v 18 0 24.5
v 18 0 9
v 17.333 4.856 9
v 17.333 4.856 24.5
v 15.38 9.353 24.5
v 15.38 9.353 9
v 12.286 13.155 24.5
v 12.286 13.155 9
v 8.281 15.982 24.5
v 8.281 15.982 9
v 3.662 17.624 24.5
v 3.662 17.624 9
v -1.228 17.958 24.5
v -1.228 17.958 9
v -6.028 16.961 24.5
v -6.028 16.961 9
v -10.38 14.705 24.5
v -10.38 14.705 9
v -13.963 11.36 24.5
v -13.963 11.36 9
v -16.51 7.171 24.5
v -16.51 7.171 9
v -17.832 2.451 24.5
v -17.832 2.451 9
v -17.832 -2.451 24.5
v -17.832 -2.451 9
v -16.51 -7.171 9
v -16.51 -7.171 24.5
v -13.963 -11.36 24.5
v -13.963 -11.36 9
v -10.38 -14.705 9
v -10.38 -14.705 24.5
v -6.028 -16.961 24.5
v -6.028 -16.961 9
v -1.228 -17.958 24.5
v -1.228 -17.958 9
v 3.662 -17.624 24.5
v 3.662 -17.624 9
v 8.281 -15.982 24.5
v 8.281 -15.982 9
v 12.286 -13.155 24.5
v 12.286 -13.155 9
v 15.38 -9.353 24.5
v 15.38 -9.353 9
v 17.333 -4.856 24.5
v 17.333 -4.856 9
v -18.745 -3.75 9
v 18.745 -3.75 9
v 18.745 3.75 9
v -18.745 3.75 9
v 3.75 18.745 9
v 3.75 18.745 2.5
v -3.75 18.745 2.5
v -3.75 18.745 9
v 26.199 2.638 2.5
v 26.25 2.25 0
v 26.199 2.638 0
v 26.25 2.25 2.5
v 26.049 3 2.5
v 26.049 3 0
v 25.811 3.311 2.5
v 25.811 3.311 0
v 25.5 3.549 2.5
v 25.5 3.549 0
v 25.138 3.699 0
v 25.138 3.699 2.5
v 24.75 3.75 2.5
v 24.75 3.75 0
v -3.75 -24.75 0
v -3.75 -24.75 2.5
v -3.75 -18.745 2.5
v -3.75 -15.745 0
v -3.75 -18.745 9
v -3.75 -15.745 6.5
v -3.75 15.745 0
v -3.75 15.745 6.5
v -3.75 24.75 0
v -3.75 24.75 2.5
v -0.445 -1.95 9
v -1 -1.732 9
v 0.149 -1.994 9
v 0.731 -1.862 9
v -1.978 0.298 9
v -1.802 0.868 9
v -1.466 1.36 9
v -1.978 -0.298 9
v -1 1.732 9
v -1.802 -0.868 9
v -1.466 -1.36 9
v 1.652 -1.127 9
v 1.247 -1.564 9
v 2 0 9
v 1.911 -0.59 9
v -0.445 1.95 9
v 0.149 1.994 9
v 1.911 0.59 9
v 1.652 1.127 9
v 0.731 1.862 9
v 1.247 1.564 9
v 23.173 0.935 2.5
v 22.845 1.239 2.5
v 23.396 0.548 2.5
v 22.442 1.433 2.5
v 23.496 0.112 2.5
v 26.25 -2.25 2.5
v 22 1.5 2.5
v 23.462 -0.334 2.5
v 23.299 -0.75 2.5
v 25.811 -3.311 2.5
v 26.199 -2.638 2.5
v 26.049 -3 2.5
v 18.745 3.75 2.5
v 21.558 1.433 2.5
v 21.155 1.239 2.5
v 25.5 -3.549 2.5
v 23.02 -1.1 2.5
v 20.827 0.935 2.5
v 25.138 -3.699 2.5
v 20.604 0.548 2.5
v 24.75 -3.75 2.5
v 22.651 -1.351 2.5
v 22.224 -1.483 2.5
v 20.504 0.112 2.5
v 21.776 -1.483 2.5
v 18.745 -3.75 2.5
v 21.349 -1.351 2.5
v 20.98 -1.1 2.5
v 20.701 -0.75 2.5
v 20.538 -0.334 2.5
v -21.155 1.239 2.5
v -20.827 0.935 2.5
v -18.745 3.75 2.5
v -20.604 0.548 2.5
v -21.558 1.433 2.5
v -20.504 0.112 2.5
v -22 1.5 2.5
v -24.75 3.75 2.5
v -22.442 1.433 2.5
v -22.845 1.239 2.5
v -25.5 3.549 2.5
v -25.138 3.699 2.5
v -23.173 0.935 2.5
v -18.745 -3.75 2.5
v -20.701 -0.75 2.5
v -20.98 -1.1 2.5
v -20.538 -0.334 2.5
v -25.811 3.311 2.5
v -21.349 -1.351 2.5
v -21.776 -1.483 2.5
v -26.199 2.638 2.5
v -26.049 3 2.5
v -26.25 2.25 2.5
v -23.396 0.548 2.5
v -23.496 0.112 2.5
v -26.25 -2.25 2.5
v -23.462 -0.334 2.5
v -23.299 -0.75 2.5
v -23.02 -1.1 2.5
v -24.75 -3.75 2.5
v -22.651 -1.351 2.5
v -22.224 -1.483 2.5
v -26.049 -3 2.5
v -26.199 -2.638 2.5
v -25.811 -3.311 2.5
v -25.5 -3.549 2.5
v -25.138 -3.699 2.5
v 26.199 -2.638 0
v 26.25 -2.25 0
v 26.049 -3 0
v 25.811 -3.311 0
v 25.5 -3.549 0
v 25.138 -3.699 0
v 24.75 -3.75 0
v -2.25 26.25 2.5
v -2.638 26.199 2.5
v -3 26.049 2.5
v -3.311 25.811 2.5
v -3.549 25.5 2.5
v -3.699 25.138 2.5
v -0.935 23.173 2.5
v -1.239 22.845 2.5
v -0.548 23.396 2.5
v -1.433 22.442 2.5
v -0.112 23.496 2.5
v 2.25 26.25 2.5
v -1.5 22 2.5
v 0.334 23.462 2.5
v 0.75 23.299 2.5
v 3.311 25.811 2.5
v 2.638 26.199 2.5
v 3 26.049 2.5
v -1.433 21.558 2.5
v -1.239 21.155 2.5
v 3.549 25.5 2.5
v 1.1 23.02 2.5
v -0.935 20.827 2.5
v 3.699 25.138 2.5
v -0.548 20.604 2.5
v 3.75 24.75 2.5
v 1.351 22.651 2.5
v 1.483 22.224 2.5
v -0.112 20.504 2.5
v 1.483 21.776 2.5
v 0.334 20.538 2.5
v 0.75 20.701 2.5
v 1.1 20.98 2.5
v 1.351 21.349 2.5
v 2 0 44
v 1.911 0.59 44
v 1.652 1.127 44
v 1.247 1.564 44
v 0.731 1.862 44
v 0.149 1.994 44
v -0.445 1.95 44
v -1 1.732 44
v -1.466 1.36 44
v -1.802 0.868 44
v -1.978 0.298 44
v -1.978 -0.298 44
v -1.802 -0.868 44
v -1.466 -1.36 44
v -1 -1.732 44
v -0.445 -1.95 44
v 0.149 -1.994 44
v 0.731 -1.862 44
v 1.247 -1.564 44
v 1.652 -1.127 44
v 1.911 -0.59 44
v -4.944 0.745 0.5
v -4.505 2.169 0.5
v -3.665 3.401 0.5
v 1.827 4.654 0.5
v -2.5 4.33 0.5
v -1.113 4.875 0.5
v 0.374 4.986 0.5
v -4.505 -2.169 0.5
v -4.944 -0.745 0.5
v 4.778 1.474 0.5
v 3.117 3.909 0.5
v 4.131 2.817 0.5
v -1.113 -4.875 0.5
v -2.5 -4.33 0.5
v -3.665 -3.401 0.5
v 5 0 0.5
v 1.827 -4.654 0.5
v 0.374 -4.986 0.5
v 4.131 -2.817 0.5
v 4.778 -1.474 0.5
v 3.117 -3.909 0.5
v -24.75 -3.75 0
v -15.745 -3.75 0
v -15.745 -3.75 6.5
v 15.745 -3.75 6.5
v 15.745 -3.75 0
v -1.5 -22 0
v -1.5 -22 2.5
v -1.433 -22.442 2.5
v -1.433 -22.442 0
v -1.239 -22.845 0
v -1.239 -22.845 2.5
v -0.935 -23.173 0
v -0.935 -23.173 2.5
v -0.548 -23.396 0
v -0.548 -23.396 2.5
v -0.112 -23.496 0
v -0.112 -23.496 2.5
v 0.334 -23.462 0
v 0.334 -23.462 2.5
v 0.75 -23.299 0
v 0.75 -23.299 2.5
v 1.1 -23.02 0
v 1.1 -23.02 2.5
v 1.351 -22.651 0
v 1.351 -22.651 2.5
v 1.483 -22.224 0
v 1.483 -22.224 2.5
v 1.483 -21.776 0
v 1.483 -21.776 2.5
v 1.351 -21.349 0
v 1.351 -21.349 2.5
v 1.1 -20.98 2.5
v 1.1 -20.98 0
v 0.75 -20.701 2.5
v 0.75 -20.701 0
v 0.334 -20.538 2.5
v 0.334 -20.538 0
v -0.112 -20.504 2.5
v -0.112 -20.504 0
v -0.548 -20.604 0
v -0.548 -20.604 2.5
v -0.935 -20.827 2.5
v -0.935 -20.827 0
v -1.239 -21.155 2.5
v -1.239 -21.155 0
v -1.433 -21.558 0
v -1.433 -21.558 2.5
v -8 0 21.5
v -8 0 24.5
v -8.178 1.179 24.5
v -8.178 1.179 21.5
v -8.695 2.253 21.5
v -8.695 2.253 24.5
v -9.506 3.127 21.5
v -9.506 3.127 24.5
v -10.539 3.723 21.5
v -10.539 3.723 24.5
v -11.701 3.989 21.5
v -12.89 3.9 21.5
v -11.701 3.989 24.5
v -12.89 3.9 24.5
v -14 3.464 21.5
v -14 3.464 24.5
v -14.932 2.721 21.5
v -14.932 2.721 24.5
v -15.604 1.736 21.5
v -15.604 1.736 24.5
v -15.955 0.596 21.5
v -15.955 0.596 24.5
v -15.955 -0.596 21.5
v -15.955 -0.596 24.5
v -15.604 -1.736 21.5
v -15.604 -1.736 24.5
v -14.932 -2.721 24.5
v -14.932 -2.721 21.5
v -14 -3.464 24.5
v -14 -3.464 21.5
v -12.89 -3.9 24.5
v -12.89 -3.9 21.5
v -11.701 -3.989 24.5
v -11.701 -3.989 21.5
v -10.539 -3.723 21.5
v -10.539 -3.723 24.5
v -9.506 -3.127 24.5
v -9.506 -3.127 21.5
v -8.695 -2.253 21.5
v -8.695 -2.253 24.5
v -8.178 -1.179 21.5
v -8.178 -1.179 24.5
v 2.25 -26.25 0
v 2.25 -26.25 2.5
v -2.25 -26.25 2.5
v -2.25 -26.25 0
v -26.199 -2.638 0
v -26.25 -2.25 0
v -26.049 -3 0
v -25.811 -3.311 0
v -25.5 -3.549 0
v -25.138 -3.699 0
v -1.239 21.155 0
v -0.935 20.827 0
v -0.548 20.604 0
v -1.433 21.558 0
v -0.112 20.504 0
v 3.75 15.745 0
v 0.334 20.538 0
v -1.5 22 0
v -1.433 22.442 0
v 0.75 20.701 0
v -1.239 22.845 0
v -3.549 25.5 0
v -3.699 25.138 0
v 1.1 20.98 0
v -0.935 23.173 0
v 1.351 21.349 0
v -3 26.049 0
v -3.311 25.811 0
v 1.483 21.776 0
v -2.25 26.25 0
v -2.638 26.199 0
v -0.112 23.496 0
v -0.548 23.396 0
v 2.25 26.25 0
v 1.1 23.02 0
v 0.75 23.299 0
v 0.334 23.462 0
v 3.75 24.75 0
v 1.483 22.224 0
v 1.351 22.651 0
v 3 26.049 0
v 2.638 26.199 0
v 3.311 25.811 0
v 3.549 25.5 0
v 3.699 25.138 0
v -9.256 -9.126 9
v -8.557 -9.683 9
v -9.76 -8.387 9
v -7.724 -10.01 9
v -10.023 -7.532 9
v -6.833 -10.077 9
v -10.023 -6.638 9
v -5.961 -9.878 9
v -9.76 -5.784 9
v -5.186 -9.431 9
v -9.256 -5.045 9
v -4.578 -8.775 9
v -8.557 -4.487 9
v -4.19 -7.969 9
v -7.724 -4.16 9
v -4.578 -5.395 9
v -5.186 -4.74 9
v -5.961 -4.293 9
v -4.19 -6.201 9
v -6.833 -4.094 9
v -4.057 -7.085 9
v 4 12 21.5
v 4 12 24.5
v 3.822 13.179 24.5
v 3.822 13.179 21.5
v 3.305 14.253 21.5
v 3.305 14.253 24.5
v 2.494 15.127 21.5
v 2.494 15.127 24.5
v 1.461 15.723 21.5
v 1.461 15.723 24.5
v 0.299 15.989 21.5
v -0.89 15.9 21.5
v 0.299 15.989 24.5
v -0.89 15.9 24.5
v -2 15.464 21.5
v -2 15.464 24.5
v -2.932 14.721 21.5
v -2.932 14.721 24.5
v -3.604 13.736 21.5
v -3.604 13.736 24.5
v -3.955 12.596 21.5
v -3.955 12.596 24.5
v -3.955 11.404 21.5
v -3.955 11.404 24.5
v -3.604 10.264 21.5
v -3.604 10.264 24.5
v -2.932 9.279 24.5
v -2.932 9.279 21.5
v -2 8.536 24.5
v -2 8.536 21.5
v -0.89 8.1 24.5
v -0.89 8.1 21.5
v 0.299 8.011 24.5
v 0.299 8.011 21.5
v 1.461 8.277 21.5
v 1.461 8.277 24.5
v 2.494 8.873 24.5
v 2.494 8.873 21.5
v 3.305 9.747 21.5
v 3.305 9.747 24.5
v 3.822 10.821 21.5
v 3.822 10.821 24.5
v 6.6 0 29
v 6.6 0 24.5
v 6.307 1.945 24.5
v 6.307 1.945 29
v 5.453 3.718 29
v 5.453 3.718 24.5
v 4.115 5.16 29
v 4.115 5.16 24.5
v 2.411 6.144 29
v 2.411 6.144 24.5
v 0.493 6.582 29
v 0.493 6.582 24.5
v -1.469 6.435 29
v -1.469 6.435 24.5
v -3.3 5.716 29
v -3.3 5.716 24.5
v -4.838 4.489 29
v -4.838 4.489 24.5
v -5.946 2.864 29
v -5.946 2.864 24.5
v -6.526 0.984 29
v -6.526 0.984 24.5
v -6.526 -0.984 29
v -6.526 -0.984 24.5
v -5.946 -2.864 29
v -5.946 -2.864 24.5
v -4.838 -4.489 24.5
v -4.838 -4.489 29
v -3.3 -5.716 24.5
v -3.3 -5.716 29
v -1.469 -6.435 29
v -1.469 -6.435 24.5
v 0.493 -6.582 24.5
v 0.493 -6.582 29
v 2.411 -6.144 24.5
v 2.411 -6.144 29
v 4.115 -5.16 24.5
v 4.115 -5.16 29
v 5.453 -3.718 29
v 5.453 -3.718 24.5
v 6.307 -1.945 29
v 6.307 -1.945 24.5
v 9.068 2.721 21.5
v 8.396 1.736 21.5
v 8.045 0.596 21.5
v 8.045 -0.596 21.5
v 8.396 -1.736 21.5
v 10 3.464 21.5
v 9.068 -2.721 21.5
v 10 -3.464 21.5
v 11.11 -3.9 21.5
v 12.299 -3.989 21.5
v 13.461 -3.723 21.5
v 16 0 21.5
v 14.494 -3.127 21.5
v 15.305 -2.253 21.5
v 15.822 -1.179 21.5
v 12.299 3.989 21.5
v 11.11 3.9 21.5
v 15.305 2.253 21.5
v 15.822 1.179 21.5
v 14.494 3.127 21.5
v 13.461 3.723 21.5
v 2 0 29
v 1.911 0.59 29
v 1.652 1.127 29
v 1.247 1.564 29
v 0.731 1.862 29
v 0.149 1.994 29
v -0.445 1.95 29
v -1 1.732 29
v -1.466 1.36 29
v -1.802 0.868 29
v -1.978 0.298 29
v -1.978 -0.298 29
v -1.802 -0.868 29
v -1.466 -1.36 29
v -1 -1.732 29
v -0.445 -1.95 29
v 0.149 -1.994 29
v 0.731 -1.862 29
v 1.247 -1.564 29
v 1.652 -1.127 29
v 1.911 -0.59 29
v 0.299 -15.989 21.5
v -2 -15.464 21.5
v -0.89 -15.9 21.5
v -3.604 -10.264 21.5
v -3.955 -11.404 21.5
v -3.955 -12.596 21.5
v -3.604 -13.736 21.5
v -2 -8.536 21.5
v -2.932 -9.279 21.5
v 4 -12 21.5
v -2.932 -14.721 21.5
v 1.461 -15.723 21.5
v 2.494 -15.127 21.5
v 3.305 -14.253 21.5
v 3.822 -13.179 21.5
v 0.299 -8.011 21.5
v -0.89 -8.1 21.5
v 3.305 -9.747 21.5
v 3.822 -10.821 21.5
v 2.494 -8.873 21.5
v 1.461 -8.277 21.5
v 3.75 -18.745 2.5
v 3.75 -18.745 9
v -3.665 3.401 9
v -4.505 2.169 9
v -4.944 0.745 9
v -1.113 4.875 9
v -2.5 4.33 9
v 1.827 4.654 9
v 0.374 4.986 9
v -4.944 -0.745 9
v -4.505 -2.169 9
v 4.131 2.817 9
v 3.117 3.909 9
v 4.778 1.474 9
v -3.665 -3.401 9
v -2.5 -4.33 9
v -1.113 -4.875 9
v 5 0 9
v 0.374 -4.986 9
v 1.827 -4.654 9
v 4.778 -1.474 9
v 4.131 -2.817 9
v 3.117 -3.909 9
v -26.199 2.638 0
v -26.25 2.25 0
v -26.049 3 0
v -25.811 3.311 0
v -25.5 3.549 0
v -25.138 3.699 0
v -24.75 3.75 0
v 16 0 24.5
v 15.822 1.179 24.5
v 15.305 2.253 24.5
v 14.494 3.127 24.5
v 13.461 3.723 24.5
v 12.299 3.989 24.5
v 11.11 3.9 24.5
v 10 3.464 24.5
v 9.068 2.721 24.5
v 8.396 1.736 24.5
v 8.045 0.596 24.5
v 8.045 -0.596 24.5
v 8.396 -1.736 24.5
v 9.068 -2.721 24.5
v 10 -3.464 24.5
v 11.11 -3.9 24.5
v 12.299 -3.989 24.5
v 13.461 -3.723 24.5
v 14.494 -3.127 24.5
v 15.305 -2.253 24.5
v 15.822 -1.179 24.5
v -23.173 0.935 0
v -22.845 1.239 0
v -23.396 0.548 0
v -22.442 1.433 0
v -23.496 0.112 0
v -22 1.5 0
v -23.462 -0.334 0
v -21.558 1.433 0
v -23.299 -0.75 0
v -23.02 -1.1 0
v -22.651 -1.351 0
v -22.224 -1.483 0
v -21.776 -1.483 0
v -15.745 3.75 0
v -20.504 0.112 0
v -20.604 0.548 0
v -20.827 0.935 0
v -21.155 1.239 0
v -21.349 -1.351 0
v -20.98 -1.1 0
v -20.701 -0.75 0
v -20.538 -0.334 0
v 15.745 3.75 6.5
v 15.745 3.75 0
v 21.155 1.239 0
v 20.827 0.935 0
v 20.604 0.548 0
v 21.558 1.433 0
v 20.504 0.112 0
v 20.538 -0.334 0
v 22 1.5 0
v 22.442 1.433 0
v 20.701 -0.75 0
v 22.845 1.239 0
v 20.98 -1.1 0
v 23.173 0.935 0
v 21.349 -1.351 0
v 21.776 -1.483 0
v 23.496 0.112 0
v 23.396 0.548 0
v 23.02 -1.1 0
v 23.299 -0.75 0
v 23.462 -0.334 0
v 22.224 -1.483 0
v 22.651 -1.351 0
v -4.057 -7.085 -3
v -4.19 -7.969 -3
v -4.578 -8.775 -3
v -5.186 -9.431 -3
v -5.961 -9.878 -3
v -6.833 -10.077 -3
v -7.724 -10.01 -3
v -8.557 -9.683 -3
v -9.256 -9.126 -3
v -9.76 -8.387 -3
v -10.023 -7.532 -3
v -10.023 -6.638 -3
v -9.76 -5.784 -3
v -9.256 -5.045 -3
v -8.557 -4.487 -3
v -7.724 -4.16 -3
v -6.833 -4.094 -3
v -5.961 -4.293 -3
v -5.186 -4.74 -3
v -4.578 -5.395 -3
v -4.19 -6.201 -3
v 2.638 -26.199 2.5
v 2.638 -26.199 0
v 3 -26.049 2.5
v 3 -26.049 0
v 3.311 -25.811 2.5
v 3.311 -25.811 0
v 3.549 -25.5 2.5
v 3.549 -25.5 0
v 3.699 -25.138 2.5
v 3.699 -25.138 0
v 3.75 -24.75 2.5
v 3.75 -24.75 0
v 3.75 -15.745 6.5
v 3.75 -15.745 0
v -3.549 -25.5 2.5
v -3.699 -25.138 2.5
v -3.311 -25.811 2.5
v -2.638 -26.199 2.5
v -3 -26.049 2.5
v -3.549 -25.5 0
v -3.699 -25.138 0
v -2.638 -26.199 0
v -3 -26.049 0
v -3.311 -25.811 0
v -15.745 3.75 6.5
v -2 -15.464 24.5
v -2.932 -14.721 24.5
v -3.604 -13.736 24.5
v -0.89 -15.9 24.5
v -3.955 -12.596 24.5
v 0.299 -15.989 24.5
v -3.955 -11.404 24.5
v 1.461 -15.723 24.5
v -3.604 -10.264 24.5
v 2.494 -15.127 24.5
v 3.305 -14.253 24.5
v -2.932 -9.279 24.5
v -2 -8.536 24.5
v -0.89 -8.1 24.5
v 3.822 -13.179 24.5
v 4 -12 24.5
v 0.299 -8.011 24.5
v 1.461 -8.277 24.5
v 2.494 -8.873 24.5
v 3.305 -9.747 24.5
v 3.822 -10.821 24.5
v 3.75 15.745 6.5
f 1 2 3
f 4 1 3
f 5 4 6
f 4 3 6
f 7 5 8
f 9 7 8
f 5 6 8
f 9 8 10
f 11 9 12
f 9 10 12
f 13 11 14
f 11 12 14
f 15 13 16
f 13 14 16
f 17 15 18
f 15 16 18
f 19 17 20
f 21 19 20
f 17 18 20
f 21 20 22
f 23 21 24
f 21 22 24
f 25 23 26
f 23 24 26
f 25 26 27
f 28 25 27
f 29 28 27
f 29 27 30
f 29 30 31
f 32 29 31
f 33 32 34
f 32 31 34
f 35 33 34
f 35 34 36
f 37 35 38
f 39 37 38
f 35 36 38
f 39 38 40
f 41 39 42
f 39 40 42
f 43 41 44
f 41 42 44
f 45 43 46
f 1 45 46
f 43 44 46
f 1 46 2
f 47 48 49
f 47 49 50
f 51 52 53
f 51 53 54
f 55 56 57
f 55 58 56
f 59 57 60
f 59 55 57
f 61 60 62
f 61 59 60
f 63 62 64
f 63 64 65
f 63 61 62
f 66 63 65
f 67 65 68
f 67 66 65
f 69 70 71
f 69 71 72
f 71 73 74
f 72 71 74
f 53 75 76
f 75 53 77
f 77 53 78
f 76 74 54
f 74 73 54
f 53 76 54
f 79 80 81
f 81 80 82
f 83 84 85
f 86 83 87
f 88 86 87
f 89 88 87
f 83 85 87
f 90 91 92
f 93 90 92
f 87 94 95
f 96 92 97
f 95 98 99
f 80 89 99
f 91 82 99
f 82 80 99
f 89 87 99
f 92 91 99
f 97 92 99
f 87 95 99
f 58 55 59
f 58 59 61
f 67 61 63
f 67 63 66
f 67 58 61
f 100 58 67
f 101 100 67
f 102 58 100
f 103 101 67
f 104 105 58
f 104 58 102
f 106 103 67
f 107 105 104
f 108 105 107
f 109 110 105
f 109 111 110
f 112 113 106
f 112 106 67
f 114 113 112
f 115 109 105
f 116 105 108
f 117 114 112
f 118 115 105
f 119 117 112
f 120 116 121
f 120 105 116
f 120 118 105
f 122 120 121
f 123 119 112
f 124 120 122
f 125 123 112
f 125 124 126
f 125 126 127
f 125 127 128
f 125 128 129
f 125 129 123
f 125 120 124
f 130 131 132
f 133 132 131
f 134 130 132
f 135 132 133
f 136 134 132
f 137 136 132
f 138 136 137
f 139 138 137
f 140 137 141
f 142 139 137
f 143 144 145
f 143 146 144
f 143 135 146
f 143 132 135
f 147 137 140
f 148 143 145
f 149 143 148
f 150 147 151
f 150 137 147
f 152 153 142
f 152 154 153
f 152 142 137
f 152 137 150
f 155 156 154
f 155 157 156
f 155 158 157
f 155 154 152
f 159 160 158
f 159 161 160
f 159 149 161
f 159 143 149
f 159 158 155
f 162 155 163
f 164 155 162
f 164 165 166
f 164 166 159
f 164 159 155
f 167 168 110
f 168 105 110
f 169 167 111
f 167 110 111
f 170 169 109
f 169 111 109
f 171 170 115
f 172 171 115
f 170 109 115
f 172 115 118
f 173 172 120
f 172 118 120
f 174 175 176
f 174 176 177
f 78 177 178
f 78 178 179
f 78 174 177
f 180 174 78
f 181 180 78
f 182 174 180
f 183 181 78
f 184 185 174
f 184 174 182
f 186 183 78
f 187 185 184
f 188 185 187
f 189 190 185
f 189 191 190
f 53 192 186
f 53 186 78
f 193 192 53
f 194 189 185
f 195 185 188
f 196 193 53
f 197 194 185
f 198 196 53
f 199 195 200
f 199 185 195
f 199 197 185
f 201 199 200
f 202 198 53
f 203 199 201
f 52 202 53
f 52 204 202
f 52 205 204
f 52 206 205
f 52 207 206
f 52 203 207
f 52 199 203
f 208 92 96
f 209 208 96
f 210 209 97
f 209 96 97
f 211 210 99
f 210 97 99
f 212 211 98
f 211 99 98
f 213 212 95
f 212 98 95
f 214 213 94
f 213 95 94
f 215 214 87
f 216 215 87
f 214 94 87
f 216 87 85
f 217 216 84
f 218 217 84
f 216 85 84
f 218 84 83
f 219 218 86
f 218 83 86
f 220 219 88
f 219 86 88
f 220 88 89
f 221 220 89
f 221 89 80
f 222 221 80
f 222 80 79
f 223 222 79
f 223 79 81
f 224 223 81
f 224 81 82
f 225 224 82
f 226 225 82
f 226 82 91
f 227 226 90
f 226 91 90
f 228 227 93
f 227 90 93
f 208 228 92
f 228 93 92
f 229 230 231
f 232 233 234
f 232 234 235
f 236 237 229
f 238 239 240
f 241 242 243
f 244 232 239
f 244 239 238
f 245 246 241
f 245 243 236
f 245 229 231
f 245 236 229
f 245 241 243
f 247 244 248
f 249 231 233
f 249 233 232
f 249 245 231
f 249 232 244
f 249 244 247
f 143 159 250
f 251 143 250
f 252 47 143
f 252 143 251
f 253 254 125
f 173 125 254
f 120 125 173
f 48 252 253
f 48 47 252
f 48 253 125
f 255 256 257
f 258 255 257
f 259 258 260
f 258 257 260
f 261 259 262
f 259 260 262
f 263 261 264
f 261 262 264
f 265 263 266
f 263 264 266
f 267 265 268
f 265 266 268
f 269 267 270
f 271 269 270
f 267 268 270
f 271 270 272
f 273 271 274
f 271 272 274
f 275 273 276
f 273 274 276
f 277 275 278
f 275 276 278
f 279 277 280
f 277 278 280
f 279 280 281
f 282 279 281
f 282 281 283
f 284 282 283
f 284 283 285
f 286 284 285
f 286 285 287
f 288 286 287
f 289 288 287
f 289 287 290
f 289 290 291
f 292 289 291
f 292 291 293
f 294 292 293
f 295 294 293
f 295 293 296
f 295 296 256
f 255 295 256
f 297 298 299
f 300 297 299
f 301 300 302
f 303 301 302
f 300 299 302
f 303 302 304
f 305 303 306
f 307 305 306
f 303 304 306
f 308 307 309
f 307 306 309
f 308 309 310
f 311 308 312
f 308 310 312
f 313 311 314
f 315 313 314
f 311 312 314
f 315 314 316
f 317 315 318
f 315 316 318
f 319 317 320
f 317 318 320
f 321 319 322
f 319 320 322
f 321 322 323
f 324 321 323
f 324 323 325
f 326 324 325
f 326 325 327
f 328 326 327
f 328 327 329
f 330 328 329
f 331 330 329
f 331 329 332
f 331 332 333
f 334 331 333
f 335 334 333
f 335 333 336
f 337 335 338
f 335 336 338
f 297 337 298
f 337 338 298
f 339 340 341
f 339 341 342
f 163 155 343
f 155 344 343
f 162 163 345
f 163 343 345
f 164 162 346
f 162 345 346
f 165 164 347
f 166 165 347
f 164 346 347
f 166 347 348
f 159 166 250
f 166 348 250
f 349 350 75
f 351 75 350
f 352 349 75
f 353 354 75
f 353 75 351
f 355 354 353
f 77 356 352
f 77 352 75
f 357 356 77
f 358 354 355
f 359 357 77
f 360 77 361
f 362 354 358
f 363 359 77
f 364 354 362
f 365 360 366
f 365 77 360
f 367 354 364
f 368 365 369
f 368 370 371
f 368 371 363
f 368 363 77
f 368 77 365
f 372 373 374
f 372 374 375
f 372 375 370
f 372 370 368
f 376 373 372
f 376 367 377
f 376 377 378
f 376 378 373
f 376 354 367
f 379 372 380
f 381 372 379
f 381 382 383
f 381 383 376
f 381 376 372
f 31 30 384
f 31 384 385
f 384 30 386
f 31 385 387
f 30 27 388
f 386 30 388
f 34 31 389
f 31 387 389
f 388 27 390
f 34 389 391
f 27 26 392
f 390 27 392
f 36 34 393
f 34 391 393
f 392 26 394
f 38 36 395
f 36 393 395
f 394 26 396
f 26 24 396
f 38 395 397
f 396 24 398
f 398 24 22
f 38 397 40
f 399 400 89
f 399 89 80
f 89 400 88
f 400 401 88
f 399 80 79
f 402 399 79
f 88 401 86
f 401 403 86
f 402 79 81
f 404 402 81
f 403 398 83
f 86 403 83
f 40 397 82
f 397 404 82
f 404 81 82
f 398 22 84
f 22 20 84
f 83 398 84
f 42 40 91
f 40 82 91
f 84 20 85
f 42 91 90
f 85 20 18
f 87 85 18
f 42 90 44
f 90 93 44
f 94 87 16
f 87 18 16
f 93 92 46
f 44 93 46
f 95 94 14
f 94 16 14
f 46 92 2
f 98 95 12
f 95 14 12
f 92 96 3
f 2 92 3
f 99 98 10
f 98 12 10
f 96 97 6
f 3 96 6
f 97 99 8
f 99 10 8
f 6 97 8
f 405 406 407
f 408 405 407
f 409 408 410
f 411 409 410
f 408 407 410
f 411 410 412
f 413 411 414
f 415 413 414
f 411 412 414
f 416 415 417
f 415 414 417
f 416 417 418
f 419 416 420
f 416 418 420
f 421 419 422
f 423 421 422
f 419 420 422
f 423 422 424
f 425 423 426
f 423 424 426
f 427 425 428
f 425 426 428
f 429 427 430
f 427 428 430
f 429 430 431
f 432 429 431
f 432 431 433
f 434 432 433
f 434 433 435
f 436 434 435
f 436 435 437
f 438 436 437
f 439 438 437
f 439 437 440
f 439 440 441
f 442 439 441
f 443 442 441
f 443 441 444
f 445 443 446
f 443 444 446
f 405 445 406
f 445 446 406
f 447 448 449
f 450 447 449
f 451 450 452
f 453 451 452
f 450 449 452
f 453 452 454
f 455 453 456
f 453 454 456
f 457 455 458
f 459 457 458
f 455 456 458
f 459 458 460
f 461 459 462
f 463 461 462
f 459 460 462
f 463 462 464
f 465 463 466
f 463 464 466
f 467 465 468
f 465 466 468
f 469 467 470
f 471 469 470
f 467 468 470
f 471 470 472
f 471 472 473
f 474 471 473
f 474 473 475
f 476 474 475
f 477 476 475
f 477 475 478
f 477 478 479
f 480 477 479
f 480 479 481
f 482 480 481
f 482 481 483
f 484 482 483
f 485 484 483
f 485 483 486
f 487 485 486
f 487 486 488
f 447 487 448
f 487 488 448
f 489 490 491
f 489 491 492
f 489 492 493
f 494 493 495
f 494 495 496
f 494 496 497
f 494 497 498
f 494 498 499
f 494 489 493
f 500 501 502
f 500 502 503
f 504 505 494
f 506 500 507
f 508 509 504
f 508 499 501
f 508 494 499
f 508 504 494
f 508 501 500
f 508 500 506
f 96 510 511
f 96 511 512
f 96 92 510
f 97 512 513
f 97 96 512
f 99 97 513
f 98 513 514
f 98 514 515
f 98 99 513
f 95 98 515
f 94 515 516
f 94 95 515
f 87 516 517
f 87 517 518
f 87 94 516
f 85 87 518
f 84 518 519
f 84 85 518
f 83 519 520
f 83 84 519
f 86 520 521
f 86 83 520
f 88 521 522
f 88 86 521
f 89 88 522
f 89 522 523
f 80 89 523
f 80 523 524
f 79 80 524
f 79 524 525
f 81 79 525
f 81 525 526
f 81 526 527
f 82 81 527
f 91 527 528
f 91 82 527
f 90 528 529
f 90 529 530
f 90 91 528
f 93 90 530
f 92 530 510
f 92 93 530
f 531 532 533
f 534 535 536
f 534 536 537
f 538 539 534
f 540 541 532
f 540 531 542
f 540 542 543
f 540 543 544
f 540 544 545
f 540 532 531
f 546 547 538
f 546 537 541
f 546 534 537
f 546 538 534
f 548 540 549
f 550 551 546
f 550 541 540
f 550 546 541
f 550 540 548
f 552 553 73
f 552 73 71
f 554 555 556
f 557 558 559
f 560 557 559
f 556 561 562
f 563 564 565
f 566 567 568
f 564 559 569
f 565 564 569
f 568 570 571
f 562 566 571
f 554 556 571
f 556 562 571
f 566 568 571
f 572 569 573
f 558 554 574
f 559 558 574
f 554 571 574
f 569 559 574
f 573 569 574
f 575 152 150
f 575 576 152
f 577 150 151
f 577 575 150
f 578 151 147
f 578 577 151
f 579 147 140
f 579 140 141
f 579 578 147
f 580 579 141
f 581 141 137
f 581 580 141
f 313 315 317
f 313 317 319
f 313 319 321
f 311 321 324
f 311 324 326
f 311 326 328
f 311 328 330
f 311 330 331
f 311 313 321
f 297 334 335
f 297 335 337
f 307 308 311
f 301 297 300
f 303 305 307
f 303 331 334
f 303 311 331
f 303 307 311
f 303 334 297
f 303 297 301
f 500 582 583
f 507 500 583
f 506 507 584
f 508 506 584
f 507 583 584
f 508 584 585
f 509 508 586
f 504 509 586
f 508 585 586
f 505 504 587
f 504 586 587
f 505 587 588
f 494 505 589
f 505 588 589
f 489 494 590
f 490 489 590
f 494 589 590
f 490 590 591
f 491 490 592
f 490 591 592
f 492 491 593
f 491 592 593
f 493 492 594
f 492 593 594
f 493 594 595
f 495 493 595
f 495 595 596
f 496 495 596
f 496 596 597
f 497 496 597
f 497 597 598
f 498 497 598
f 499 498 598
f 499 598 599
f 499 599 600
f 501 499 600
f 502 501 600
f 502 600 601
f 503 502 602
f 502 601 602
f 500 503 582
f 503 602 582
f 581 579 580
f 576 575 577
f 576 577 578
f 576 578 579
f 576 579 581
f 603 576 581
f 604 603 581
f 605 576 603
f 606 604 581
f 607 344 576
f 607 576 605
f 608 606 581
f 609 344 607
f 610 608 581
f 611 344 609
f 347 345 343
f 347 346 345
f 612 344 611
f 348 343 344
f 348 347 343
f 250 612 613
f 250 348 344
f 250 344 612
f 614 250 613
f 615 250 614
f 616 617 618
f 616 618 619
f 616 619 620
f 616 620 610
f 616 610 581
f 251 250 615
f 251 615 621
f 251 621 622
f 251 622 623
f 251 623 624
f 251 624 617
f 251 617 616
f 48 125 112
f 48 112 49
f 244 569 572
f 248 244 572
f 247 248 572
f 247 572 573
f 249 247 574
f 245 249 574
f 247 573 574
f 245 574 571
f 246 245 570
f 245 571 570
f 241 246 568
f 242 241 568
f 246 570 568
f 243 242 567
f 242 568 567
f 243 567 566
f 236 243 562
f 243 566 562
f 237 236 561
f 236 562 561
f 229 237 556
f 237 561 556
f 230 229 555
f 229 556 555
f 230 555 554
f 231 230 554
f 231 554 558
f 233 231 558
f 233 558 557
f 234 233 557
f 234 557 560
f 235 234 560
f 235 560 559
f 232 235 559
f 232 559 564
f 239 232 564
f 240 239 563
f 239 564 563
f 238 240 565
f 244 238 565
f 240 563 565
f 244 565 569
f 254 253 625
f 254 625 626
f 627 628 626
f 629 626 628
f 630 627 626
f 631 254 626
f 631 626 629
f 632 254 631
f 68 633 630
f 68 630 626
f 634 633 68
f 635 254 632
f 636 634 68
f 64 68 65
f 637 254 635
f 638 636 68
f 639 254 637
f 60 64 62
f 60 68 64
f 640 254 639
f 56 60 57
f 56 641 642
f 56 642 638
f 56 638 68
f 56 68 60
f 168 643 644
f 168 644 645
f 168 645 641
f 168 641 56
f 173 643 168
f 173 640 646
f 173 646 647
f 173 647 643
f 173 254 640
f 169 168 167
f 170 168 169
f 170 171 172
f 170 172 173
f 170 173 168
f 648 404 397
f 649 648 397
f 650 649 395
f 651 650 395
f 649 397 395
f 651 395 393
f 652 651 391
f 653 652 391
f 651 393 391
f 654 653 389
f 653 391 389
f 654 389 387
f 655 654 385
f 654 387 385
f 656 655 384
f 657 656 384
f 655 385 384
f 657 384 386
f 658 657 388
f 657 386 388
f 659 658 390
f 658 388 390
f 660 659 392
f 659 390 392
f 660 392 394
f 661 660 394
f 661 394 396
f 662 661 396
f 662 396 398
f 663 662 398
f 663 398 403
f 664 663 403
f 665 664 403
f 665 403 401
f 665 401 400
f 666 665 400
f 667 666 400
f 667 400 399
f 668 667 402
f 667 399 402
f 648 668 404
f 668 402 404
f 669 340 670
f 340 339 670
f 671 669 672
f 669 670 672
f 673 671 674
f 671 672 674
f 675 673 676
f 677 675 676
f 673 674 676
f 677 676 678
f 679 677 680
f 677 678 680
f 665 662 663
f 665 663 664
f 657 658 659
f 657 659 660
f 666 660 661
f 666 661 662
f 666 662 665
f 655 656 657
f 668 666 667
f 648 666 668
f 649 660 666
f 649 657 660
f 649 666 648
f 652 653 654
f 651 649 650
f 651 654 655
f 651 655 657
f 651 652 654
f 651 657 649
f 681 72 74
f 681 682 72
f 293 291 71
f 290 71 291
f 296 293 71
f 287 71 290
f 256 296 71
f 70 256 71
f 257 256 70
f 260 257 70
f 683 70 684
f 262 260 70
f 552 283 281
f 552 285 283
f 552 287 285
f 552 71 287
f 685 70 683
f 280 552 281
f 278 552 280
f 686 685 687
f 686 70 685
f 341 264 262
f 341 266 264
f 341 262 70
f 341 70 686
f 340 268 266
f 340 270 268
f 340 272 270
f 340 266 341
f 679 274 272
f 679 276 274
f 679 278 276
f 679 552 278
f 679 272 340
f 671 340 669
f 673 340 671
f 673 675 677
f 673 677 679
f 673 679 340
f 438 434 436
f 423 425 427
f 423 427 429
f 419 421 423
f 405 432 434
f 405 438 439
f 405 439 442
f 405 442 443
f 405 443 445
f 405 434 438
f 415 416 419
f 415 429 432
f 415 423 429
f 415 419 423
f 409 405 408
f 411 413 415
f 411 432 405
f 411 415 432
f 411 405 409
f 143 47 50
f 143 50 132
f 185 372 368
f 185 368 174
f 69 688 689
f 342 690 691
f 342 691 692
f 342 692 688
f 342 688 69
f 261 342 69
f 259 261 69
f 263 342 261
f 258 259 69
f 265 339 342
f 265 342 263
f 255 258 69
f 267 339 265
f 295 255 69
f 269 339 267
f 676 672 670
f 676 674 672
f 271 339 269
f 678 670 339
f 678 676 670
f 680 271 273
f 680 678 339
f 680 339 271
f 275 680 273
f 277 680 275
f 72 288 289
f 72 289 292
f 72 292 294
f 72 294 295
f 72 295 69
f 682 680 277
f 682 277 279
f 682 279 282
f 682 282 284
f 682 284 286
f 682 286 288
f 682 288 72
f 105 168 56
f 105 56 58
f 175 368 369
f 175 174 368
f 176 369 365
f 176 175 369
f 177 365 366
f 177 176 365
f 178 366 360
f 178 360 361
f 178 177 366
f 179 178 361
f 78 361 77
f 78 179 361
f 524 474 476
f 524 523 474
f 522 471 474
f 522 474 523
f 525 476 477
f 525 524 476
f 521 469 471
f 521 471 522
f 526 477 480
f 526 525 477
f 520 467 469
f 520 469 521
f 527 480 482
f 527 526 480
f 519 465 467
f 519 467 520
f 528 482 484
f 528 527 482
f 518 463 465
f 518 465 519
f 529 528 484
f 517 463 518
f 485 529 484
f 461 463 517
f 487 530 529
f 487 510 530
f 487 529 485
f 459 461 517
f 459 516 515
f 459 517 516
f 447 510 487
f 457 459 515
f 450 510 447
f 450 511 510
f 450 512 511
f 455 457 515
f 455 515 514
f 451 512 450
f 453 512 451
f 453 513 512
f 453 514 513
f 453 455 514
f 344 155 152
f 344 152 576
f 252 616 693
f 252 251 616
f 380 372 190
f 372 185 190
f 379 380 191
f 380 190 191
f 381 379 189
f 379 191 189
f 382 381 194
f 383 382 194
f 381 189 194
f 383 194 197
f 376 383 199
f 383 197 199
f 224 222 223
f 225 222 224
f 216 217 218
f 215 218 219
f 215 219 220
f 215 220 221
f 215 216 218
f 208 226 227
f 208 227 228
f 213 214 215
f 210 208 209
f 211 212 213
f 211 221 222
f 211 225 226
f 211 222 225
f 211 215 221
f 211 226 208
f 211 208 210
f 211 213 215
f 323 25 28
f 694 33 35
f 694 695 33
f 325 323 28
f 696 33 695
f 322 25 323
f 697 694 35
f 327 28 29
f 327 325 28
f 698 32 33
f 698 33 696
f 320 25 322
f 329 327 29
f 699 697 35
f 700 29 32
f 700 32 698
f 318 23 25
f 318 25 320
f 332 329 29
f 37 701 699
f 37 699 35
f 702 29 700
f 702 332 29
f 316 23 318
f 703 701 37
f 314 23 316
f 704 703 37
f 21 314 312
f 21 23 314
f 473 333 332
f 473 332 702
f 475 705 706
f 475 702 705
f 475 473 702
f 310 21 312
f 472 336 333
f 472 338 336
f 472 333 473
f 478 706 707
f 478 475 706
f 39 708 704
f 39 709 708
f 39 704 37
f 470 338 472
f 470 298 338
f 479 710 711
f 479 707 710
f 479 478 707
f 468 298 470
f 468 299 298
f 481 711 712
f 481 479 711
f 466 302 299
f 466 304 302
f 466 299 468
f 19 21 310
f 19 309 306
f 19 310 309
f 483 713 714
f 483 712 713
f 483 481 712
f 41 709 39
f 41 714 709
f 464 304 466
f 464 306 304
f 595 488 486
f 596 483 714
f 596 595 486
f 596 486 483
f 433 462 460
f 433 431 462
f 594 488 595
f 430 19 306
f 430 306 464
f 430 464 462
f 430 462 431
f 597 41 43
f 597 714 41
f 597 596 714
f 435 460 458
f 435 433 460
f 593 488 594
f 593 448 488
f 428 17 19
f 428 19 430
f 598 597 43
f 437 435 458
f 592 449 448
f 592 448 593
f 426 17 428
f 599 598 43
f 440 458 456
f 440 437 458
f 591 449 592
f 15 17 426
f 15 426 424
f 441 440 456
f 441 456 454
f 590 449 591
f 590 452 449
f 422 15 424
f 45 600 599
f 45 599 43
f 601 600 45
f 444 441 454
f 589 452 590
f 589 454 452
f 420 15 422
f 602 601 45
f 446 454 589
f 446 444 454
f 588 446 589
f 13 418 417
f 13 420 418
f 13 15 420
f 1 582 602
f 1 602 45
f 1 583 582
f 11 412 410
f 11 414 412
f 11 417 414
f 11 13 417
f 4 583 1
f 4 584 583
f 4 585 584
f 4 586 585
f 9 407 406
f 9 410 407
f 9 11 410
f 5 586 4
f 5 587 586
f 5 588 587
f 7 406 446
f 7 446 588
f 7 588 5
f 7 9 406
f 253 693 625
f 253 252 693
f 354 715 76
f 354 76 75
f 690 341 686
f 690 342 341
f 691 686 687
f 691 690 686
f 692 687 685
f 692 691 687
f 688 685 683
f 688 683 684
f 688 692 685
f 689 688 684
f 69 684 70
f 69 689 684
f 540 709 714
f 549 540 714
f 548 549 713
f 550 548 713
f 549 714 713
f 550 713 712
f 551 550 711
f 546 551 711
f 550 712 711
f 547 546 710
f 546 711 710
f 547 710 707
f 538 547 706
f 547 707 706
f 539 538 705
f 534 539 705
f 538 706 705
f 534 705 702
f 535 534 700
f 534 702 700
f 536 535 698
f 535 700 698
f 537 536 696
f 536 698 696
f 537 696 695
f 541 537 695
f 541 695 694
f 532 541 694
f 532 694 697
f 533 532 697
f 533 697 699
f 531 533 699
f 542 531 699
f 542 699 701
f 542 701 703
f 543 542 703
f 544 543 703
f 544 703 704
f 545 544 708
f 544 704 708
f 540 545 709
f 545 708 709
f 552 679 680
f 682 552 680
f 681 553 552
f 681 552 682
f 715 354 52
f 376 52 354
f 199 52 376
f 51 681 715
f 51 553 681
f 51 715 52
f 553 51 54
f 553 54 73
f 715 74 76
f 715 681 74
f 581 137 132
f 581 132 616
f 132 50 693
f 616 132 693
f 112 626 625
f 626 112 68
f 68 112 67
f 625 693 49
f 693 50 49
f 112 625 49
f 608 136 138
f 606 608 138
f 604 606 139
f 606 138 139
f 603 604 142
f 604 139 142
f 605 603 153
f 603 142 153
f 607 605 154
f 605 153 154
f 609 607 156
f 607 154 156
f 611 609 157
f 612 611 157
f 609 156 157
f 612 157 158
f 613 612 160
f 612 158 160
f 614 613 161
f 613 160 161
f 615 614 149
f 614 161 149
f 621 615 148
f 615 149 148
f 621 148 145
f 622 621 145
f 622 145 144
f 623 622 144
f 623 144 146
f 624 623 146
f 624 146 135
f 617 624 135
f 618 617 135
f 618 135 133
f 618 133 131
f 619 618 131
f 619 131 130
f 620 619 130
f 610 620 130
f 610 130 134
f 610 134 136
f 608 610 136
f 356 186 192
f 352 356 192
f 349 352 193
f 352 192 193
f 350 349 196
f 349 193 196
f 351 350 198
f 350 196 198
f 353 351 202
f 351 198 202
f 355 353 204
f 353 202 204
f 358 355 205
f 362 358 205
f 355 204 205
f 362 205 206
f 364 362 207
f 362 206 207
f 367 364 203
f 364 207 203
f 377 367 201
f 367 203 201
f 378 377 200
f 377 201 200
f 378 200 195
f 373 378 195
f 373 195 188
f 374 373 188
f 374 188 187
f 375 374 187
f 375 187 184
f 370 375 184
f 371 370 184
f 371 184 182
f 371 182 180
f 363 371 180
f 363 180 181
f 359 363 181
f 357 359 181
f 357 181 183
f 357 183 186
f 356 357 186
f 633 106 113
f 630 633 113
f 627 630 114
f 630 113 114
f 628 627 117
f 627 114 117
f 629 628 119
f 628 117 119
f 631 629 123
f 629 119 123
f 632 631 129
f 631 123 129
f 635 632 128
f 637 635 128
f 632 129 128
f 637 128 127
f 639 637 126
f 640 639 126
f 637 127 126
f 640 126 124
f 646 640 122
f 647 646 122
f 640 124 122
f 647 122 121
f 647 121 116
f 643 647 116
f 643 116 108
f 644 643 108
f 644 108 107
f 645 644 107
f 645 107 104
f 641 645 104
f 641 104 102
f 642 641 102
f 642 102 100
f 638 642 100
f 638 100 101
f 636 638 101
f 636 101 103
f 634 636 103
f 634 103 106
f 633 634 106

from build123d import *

# Parameters (mm, degrees)
F1_DEPTH  = 3.75
F2_R      = 18
F2_R_2    = 2
F3_DEPTH  = 15.5
F4_R      = 6.6
F4_R_2    = 2
F5_DEPTH  = 4.5
F6_R      = 5
F7_DEPTH  = 8.5
F8_R      = 2
F9_DEPTH  = 35
F10_R     = 4
F11_DEPTH = 3
F12_ANGLE = 90
F13_R     = 1.5
F14_R     = 3
F15_DEPTH = 12
F16_R     = 1.5
F17_DEPTH = 25
F19_ANGLE = 90
F21_D     = 3
F21_2_D   = 3


with BuildPart() as f1:
    # F0 (on Right) → F1 (new body, symmetric)
    with BuildSketch(Plane.YZ):
        Polygon((-15.745, 6.5), (0, 6.5), (0, 9), (-18.745, 9), (-18.745, 2.5), (-26.25, 2.5), (-26.25, 0), (-15.745, 0), align=None)
        Polygon((0, 9), (0, 6.5), (15.745, 6.5), (15.745, 0), (26.25, 0), (26.25, 2.5), (18.745, 2.5), (18.745, 9), align=None)
    extrude(amount=F1_DEPTH, both=True)

    # F13
    f13_edges = [f1.edges().sort_by_distance(p)[0] for p in [
        (3.75, 26.25, 1.25),
        (-3.75, 26.25, 1.25),
        (3.75, -26.25, 1.25),
        (-3.75, -26.25, 1.25),
    ]]
    fillet(f13_edges, radius=F13_R)

    # F21 (through all)
    with Locations(Plane(origin=(0, 0, 0), x_dir=(1, 0, 0), z_dir=(0, 0, -1))):
        with Locations((-22, 0), (0, 22), (0, -22), (22, 0)):
            Hole(F21_D / 2)


with BuildPart() as f3:
    # F2 (on face) → F3 (new body)
    with BuildSketch(Plane.XY.offset(9)):
        Circle(F2_R)
        Circle(F2_R_2, mode=Mode.SUBTRACT)
    extrude(amount=F3_DEPTH)

    # F4 (on face) → F5 (join)
    with BuildSketch(Plane.XY.offset(24.5)):
        Circle(F4_R)
        Circle(F4_R_2, mode=Mode.SUBTRACT)
    extrude(amount=F5_DEPTH)

    # F10 (on face) → F11 (cut)
    with BuildSketch(Plane.XY.offset(24.5)):
        with Locations((-12, 0)):
            Circle(F10_R)
        with Locations((0, -12)):
            Circle(F10_R)
        with Locations((0, 12)):
            Circle(F10_R)
        with Locations((12, 0)):
            Circle(F10_R)
    extrude(amount=-F11_DEPTH, mode=Mode.SUBTRACT)

    # F14 (on face) → F15 (join)
    with BuildSketch(Plane(origin=(0, 0, 9), x_dir=(1, 0, 0), z_dir=(0, 0, -1))):
        with Locations((-7.05688, 7.085227)):
            Circle(F14_R)
    extrude(amount=F15_DEPTH)


with BuildPart() as f7:
    # F6 (on face) → F7 (new body)
    with BuildSketch(Plane(origin=(0, 0, 9), x_dir=(1, 0, 0), z_dir=(0, 0, -1))):
        Circle(F6_R)
    extrude(amount=F7_DEPTH)


with BuildPart() as f9:
    # F8 (on face) → F9 (new body)
    with BuildSketch(Plane.XY.offset(9)):
        Circle(F8_R)
    extrude(amount=F9_DEPTH)


with BuildPart() as f12_1:
    # F12: copy of F1
    add(f1.part.rotate(Axis((0, 0, 9), (0, 0, -1)), F12_ANGLE))

    # F16 (on face) → F17 (cut)
    with BuildSketch(Plane(origin=(0, 0, 0), x_dir=(1, 0, 0), z_dir=(0, 0, -1))):
        with Locations((-22, 0)):
            Circle(F16_R)
        with Locations((22, 0)):
            Circle(F16_R)
    extrude(amount=-F17_DEPTH, mode=Mode.SUBTRACT)


with BuildPart() as f19_1:
    # F19: copy of F1
    add(f1.part.rotate(Axis((0, 0, 9), (0, 0, -1)), F19_ANGLE))

    # F21#2 (through all)
    with Locations(Plane(origin=(0, 0, 0), x_dir=(1, 0, 0), z_dir=(0, 0, -1))):
        with Locations((-22, 0), (0, 22), (0, -22), (22, 0)):
            Hole(F21_2_D / 2)


solid = Compound([f1.part, f3.part, f7.part, f9.part, f19_1.part])
